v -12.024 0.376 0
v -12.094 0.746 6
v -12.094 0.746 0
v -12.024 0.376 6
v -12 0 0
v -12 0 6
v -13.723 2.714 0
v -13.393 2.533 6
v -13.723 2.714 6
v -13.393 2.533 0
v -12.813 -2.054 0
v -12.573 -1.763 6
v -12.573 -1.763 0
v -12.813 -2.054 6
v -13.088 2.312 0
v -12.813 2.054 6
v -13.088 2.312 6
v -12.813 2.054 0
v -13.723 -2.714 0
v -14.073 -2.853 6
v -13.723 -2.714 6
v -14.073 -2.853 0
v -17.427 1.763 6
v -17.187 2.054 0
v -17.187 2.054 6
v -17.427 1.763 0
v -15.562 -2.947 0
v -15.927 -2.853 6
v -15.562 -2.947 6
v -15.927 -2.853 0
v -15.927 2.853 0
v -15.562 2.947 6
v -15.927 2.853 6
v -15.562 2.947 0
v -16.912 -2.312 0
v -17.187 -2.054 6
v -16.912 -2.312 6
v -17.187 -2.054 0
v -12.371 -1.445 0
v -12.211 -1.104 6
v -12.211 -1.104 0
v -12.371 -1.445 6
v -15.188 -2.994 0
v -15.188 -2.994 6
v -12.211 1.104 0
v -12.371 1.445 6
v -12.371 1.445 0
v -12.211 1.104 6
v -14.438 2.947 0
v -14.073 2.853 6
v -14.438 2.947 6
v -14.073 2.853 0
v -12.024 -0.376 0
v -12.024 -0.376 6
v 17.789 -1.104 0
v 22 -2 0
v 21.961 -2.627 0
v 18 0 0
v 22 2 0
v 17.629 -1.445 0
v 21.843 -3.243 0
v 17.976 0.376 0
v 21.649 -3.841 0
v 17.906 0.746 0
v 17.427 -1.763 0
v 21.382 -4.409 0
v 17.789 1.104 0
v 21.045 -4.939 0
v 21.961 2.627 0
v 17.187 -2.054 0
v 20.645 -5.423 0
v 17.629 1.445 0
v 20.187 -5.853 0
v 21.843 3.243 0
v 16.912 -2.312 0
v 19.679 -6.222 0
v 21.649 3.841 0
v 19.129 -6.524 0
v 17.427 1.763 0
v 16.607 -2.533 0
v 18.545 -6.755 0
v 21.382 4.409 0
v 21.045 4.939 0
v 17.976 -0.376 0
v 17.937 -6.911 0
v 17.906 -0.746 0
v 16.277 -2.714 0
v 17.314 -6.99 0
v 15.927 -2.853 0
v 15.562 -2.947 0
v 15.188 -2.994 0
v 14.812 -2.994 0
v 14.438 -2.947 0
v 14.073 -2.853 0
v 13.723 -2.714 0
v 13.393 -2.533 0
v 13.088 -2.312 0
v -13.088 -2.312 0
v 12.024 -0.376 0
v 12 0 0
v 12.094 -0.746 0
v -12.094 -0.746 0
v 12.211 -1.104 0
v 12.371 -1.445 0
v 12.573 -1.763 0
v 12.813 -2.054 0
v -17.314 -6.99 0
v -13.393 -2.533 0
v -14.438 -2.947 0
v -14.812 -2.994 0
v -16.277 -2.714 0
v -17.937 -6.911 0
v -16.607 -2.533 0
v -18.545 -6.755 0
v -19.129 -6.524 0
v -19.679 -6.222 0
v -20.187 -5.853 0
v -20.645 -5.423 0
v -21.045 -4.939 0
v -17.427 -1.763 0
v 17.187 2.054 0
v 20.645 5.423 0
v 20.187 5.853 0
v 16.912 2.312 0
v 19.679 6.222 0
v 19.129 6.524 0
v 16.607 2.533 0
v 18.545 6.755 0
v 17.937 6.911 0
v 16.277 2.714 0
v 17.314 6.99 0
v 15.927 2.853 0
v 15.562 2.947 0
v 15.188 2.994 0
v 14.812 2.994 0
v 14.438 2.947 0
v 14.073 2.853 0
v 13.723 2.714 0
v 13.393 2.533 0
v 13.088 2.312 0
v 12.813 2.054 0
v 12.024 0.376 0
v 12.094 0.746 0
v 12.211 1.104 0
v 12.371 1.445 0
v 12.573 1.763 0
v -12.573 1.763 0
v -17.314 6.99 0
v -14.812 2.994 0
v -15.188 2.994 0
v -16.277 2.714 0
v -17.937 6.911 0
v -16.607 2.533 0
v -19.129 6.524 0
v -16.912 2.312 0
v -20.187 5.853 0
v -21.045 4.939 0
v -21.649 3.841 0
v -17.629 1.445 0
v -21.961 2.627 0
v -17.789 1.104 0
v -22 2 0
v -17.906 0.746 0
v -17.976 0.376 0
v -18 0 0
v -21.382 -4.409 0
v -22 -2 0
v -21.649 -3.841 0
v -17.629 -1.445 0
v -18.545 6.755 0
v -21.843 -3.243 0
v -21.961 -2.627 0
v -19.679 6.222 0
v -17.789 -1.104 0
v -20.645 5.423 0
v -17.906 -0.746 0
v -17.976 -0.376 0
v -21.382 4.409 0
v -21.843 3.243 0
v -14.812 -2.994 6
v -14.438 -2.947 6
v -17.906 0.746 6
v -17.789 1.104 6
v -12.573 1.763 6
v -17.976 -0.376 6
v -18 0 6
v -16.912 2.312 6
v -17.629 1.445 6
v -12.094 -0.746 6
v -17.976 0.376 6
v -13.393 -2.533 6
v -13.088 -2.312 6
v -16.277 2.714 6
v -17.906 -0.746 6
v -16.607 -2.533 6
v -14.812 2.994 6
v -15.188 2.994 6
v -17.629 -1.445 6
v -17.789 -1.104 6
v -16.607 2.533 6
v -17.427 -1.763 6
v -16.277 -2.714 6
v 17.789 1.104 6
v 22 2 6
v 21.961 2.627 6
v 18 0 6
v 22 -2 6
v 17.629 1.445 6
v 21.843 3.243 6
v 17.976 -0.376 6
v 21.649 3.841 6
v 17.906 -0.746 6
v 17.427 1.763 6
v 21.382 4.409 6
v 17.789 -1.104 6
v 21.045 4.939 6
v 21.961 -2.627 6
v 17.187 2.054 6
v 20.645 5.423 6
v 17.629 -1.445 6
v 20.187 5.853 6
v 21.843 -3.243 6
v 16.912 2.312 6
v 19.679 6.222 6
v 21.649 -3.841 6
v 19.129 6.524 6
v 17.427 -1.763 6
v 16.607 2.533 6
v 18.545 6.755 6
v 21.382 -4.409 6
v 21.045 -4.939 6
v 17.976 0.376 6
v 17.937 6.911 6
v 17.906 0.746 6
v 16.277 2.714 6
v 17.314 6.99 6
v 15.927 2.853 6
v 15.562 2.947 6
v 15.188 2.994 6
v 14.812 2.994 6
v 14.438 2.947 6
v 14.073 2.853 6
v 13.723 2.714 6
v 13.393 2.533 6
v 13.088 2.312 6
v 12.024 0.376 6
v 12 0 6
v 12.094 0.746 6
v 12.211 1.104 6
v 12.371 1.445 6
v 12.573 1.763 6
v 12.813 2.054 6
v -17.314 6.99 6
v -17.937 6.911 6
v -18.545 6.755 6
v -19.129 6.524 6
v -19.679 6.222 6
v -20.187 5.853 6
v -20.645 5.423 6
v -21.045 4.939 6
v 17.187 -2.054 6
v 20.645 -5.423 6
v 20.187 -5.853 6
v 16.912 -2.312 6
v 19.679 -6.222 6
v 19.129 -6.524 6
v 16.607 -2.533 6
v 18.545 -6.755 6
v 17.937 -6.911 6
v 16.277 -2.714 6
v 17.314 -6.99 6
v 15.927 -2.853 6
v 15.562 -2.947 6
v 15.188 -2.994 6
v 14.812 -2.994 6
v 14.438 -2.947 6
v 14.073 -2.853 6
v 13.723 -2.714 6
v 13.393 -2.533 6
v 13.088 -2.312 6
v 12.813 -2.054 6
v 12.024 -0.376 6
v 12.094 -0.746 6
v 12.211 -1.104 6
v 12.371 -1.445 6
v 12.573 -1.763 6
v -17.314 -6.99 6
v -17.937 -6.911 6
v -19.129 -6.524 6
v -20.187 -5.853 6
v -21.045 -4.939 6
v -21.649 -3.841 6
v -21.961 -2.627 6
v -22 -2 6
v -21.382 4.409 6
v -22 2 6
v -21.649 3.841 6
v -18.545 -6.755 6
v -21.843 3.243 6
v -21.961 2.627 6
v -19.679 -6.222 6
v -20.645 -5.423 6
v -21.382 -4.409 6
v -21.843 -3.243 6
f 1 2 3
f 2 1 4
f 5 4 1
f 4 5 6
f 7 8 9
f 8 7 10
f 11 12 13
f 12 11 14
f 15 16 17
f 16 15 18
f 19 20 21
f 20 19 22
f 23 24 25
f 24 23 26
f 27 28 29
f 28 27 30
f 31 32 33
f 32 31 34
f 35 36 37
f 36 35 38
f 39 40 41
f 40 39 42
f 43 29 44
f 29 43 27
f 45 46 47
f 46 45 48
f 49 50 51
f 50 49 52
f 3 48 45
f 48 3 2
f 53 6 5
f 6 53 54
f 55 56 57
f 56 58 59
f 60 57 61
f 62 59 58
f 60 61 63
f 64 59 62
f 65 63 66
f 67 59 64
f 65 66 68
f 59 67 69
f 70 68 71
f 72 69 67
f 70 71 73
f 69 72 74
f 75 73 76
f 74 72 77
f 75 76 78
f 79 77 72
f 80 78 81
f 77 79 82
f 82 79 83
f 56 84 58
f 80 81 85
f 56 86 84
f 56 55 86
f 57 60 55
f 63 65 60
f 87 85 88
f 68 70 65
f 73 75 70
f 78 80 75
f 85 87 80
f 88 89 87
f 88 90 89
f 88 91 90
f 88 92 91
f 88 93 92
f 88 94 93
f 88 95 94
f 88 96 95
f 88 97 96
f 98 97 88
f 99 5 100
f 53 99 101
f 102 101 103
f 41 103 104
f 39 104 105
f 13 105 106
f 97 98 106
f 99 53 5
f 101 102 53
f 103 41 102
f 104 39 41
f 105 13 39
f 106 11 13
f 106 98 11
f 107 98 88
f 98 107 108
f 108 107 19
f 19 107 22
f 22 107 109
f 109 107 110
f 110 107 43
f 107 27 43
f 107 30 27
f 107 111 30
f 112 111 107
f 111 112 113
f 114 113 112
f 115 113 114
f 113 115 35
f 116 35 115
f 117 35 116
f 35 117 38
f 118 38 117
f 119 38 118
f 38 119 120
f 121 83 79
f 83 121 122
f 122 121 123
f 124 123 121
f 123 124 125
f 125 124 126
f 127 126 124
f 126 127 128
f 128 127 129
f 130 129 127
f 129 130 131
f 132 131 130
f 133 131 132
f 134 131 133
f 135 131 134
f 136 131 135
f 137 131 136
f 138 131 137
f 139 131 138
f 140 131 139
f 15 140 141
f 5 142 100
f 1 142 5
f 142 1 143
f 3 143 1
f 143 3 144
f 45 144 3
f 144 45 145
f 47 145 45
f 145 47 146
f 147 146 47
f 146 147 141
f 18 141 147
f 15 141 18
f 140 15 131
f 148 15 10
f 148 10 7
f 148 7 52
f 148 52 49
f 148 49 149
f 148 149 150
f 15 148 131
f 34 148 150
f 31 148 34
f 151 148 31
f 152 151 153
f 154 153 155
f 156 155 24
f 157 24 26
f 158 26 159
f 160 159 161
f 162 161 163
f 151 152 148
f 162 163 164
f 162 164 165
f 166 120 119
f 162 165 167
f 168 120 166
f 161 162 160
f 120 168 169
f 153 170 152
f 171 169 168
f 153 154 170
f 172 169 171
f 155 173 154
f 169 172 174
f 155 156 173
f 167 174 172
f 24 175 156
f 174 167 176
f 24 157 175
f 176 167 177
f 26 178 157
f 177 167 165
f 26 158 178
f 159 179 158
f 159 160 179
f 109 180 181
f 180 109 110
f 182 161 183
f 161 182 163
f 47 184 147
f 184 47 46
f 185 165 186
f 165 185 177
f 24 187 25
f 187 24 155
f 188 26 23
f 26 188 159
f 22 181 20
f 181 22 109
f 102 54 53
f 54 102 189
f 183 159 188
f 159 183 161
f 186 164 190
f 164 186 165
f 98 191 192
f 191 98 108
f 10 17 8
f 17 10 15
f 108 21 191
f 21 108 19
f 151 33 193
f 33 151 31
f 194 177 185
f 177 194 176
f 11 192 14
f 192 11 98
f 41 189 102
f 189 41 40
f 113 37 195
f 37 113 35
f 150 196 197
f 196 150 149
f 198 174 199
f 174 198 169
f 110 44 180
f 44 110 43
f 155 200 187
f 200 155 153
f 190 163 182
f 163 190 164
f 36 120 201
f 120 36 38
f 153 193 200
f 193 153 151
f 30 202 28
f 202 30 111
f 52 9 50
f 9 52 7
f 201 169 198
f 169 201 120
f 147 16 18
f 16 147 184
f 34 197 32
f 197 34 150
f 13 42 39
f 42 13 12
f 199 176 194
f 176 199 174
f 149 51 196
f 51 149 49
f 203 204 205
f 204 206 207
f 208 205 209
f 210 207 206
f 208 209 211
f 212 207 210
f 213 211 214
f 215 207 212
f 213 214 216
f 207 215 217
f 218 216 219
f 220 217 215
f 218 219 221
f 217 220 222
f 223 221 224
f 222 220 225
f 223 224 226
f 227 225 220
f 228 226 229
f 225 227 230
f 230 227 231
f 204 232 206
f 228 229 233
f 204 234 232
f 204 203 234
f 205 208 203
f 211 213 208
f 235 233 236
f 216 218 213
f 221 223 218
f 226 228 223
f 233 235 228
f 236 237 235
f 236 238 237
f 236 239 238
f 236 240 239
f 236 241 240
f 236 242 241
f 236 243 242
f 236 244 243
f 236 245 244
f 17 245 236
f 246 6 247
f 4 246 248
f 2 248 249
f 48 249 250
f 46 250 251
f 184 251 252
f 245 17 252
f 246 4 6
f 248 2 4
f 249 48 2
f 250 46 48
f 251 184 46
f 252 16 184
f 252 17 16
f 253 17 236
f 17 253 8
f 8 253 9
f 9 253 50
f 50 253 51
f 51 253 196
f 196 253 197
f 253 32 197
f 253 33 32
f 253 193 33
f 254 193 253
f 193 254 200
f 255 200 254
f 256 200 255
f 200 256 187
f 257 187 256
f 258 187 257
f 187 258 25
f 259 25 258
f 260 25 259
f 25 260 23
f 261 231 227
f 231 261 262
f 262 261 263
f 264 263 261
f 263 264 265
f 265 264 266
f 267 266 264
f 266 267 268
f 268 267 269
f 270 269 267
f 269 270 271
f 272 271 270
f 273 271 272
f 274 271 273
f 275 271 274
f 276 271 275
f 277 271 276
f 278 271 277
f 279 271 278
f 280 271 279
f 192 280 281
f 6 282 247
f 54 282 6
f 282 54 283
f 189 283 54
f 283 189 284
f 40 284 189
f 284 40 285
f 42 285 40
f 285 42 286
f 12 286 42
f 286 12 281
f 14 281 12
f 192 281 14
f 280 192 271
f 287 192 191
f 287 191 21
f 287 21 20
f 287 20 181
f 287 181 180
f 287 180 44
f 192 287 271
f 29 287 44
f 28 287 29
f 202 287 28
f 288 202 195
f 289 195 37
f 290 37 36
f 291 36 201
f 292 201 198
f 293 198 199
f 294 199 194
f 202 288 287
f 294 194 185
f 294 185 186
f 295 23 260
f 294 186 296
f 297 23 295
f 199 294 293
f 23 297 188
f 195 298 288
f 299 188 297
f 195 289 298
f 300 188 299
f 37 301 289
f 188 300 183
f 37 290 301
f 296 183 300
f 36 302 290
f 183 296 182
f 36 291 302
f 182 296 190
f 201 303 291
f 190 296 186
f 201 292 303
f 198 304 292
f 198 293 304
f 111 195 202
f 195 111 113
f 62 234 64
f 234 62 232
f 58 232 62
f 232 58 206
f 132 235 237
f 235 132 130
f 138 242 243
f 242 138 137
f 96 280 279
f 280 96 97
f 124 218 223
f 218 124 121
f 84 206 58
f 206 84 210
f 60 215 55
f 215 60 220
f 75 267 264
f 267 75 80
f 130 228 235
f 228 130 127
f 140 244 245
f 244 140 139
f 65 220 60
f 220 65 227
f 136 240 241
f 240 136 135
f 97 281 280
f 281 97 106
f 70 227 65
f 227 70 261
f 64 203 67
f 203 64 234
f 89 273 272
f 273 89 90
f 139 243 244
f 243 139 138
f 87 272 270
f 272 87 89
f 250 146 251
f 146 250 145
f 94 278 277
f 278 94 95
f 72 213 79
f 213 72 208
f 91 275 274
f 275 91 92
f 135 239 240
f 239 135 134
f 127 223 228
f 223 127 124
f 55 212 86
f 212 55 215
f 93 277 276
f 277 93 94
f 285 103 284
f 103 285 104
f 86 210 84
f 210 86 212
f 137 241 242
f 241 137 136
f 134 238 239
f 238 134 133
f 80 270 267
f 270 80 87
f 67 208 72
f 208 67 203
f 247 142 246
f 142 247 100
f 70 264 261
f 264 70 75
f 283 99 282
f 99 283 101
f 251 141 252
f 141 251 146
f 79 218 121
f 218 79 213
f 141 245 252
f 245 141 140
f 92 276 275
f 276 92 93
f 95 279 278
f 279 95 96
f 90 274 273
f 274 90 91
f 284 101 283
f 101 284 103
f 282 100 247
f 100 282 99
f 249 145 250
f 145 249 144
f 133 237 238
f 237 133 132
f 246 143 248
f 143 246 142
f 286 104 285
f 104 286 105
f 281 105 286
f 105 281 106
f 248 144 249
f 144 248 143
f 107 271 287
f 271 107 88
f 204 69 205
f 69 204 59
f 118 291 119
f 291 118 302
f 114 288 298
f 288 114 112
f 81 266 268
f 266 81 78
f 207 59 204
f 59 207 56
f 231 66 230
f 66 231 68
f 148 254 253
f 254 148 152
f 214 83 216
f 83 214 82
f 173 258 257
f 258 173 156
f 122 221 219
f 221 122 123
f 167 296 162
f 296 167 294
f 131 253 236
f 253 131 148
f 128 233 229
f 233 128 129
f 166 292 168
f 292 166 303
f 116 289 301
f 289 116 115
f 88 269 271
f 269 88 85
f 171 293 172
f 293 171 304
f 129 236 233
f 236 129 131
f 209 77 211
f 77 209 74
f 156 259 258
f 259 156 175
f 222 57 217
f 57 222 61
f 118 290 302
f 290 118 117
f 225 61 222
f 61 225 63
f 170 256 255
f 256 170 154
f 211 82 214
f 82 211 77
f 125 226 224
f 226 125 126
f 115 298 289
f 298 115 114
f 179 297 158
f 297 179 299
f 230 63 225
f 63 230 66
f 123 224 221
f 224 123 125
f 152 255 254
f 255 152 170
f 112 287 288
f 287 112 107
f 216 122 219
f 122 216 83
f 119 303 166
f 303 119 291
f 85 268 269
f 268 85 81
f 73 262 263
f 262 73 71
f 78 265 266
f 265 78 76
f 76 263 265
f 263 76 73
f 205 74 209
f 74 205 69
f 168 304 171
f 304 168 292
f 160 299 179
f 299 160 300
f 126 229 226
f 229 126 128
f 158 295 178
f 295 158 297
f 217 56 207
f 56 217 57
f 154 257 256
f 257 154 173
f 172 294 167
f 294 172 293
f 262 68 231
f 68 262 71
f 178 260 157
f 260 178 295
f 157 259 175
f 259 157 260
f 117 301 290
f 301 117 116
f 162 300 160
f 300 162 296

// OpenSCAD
$fn = 50;


difference() {
	union() {
		hull() {
			translate(v = [-17.0000000000, 2.0000000000, 0]) {
				cylinder(h = 6, r = 5);
			}
			translate(v = [17.0000000000, 2.0000000000, 0]) {
				cylinder(h = 6, r = 5);
			}
			translate(v = [-17.0000000000, -2.0000000000, 0]) {
				cylinder(h = 6, r = 5);
			}
			translate(v = [17.0000000000, -2.0000000000, 0]) {
				cylinder(h = 6, r = 5);
			}
		}
	}
	union() {
		translate(v = [-15.0000000000, 0.0000000000, 0]) {
			cylinder(h = 6, r = 3.0000000000);
		}
		translate(v = [15.0000000000, 0.0000000000, 0]) {
			cylinder(h = 6, r = 3.0000000000);
		}
		translate(v = [-15.0000000000, 0.0000000000, 0]) {
			cylinder(h = 6, r = 1.5000000000);
		}
		translate(v = [15.0000000000, 0.0000000000, 0]) {
			cylinder(h = 6, r = 1.5000000000);
		}
		translate(v = [-15.0000000000, 0.0000000000, 0]) {
			cylinder(h = 6, r = 1.5000000000);
		}
		translate(v = [15.0000000000, 0.0000000000, 0]) {
			cylinder(h = 6, r = 1.5000000000);
		}
		translate(v = [-15.0000000000, 0.0000000000, 0]) {
			cylinder(h = 6, r = 1.5000000000);
		}
		translate(v = [15.0000000000, 0.0000000000, 0]) {
			cylinder(h = 6, r = 1.5000000000);
		}
	}
}
